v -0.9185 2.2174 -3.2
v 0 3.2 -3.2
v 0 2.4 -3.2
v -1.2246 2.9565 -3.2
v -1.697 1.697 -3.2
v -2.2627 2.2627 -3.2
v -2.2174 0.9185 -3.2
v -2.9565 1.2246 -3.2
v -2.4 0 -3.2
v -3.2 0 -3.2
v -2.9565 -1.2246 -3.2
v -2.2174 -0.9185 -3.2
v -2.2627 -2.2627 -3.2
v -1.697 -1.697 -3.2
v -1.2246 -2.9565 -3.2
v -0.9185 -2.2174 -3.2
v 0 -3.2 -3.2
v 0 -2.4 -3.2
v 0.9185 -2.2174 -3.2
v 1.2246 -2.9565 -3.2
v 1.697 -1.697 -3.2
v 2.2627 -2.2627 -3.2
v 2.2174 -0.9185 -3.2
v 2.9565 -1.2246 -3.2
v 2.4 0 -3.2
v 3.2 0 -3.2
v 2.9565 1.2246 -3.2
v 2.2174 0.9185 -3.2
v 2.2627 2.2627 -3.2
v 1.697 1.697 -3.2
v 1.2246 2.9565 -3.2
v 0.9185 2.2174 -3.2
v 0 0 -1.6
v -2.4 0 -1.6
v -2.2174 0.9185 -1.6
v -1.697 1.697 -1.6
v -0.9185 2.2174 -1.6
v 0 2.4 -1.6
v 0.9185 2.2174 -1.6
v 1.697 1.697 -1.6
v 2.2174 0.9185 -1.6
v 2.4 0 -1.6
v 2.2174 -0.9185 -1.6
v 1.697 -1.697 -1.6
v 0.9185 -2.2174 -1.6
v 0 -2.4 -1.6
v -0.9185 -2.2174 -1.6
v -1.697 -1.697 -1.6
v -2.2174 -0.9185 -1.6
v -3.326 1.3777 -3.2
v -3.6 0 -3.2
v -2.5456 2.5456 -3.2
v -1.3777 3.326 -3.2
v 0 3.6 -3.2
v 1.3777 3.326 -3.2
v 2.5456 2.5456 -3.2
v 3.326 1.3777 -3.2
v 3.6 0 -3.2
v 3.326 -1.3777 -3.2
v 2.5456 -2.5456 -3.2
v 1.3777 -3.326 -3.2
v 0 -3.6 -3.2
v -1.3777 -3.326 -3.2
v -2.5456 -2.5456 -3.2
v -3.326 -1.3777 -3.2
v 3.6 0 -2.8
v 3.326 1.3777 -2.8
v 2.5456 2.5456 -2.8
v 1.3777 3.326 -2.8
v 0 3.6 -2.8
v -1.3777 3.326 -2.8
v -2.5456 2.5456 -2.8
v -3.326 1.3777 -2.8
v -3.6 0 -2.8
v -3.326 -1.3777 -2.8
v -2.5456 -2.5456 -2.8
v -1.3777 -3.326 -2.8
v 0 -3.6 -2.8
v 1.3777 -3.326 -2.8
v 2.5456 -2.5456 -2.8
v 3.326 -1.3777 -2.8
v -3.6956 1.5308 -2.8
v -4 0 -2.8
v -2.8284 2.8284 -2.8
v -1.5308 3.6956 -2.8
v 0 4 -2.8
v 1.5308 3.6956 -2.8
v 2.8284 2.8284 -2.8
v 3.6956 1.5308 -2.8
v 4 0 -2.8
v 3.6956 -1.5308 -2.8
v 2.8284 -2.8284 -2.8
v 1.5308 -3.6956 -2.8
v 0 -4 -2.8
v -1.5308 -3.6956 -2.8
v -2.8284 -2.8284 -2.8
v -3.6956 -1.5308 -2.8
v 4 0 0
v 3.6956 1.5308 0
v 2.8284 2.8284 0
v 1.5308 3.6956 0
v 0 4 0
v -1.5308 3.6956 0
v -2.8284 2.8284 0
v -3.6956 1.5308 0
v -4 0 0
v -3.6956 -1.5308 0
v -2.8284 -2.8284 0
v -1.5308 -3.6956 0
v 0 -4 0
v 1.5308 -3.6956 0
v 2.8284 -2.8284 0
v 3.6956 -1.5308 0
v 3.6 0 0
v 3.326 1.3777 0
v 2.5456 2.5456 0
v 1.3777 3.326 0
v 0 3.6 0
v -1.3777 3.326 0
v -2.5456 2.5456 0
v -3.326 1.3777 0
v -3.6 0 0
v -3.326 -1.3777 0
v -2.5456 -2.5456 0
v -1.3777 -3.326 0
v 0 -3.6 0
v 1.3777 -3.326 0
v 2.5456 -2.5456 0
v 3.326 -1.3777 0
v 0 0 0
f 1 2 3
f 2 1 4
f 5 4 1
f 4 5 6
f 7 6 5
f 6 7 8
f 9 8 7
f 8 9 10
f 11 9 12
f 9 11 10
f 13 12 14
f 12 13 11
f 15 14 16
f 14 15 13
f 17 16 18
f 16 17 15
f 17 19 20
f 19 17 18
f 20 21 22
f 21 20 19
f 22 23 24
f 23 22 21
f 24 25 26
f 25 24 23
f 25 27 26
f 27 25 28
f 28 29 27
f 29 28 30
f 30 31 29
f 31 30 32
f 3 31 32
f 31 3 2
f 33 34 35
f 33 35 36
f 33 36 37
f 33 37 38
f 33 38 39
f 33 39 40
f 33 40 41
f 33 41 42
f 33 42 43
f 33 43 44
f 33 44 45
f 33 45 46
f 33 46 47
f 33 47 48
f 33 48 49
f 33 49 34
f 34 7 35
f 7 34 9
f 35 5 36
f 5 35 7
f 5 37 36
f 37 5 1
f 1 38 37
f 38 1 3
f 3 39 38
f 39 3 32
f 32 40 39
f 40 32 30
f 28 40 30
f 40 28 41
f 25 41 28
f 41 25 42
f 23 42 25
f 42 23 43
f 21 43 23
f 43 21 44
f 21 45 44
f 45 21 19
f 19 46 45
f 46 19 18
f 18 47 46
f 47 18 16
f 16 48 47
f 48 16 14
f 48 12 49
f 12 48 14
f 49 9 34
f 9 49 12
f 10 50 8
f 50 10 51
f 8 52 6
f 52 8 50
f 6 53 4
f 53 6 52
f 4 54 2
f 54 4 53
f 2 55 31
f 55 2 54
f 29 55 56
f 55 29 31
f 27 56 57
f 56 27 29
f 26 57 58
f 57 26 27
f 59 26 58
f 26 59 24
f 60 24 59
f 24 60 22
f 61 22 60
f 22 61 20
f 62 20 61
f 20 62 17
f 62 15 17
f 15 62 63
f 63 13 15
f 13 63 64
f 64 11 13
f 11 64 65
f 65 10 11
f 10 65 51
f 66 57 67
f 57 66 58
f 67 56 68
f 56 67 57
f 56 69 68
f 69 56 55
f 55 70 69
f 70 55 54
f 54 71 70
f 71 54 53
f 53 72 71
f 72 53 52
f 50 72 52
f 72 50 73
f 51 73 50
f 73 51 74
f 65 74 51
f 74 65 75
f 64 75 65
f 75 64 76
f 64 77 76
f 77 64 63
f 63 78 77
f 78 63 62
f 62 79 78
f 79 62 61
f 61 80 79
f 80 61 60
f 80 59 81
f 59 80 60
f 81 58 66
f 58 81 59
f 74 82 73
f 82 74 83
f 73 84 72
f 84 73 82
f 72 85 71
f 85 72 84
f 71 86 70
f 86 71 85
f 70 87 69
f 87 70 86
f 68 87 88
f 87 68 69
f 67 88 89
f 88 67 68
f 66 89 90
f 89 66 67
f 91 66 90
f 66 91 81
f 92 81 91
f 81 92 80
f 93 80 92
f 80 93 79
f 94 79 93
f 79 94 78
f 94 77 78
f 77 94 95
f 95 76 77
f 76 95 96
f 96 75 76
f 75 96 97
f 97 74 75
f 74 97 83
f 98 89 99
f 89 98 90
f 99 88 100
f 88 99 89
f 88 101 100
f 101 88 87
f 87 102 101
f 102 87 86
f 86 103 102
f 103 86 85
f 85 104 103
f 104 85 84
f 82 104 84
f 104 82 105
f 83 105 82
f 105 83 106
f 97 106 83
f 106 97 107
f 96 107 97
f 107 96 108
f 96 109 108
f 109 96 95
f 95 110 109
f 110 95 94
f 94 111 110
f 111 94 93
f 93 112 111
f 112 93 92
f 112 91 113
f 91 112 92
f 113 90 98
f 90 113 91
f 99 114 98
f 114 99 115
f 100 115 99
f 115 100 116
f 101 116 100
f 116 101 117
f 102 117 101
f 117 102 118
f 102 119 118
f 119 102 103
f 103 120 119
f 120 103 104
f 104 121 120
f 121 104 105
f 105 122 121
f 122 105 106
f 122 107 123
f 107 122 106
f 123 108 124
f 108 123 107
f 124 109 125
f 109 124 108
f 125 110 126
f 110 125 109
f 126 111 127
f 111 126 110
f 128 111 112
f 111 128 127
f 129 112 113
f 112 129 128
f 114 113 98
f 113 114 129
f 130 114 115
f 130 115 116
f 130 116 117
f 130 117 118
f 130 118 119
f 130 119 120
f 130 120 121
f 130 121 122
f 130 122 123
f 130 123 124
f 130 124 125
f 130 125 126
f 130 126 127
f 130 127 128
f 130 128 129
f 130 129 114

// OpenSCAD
// file: ../p/4-4ring3.scad
use <../lib.scad>
function ldraw_lib__4_4ring3() = [
// 0 Ring  3 x 1.0
// 0 Name: 4-4ring3.dat
// 0 Author: James Jessiman
// 0 !LDRAW_ORG Primitive UPDATE 2009-01
// 0 !LICENSE Licensed under CC BY 4.0 : see CAreadme.txt
// 
// 0 BFC CERTIFY CCW
  [0,"BFC","CERTIFY"],
  [0,"BFC","CCW"],
// 
// 0 !HISTORY 1998-12-15 [PTadmin] Official Update 1998-10
// 0 !HISTORY 2002-04-05 [hafhead] Added BFC statement
// 0 !HISTORY 2002-04-25 [PTadmin] Official Update 2002-02
// 0 !HISTORY 2007-06-24 [PTadmin] Header formatted for Contributor Agreement
// 0 !HISTORY 2008-07-01 [PTadmin] Official Update 2008-01
// 0 !HISTORY 2008-08-26 [cwdee] Switch polygon winding and rename
// 0 !HISTORY 2009-05-02 [PTadmin] Official Update 2009-01
// 
// 
// 4 16 -1.5308 0 3.6956 -1.1481 0 2.7717 0 0 3 0 0 4
  [4,16,-1.5308,0,3.6956,-1.1481,0,2.7717,0,0,3,0,0,4],
// 4 16 -2.8284 0 2.8284 -2.1213 0 2.1213 -1.1481 0 2.7717 -1.5308 0 3.6956
  [4,16,-2.8284,0,2.8284,-2.1213,0,2.1213,-1.1481,0,2.7717,-1.5308,0,3.6956],
// 4 16 -3.6956 0 1.5308 -2.7717 0 1.1481 -2.1213 0 2.1213 -2.8284 0 2.8284
  [4,16,-3.6956,0,1.5308,-2.7717,0,1.1481,-2.1213,0,2.1213,-2.8284,0,2.8284],
// 4 16 -4 0 0 -3 0 0 -2.7717 0 1.1481 -3.6956 0 1.5308
  [4,16,-4,0,0,-3,0,0,-2.7717,0,1.1481,-3.6956,0,1.5308],
// 4 16 -3.6956 0 -1.5308 -2.7717 0 -1.1481 -3 0 0 -4 0 0
  [4,16,-3.6956,0,-1.5308,-2.7717,0,-1.1481,-3,0,0,-4,0,0],
// 4 16 -2.8284 0 -2.8284 -2.1213 0 -2.1213 -2.7717 0 -1.1481 -3.6956 0 -1.5308
  [4,16,-2.8284,0,-2.8284,-2.1213,0,-2.1213,-2.7717,0,-1.1481,-3.6956,0,-1.5308],
// 4 16 -1.5308 0 -3.6956 -1.1481 0 -2.7717 -2.1213 0 -2.1213 -2.8284 0 -2.8284
  [4,16,-1.5308,0,-3.6956,-1.1481,0,-2.7717,-2.1213,0,-2.1213,-2.8284,0,-2.8284],
// 4 16 0 0 -4 0 0 -3 -1.1481 0 -2.7717 -1.5308 0 -3.6956
  [4,16,0,0,-4,0,0,-3,-1.1481,0,-2.7717,-1.5308,0,-3.6956],
// 4 16 1.5308 0 -3.6956 1.1481 0 -2.7717 0 0 -3 0 0 -4
  [4,16,1.5308,0,-3.6956,1.1481,0,-2.7717,0,0,-3,0,0,-4],
// 4 16 2.8284 0 -2.8284 2.1213 0 -2.1213 1.1481 0 -2.7717 1.5308 0 -3.6956
  [4,16,2.8284,0,-2.8284,2.1213,0,-2.1213,1.1481,0,-2.7717,1.5308,0,-3.6956],
// 4 16 3.6956 0 -1.5308 2.7717 0 -1.1481 2.1213 0 -2.1213 2.8284 0 -2.8284
  [4,16,3.6956,0,-1.5308,2.7717,0,-1.1481,2.1213,0,-2.1213,2.8284,0,-2.8284],
// 4 16 4 0 0 3 0 0 2.7717 0 -1.1481 3.6956 0 -1.5308
  [4,16,4,0,0,3,0,0,2.7717,0,-1.1481,3.6956,0,-1.5308],
// 4 16 3.6956 0 1.5308 2.7717 0 1.1481 3 0 0 4 0 0
  [4,16,3.6956,0,1.5308,2.7717,0,1.1481,3,0,0,4,0,0],
// 4 16 2.8284 0 2.8284 2.1213 0 2.1213 2.7717 0 1.1481 3.6956 0 1.5308
  [4,16,2.8284,0,2.8284,2.1213,0,2.1213,2.7717,0,1.1481,3.6956,0,1.5308],
// 4 16 1.5308 0 3.6956 1.1481 0 2.7717 2.1213 0 2.1213 2.8284 0 2.8284
  [4,16,1.5308,0,3.6956,1.1481,0,2.7717,2.1213,0,2.1213,2.8284,0,2.8284],
// 4 16 0 0 4 0 0 3 1.1481 0 2.7717 1.5308 0 3.6956
  [4,16,0,0,4,0,0,3,1.1481,0,2.7717,1.5308,0,3.6956],
// 0
];
module ldraw_lib__4_4ring3(step=0, col=false, unit=2/5, alt=false, line=0.2, solid=!$preview)
    makepoly(ldraw_lib__4_4ring3(), step=step, col=col, unit=unit, alt=alt, line=line, solid=solid);
ldraw_lib__4_4ring3(line=0.2);
// file: ../p/4-4cylc.scad
use <../lib.scad>
use <4-4cyli.scad>
use <4-4disc.scad>
use <4-4edge.scad>
function ldraw_lib__4_4cylc() = [
// 0 Cylinder Closed 1.0
// 0 Name: 4-4cylc.dat
// 0 Author: Alex Taylor [anathema]
// 0 !LDRAW_ORG Primitive UPDATE 2009-02
// 0 !LICENSE Licensed under CC BY 4.0 : see CAreadme.txt
// 
// 0 BFC CERTIFY CCW
  [0,"BFC","CERTIFY"],
  [0,"BFC","CCW"],
// 
// 0 !HISTORY 2008-12-29 [cwdee] Removed one disc
// 0 !HISTORY 2009-09-03 [PTadmin] Official Update 2009-02
// 
// 
// 1 16 0 0 0 1 0 0 0 1 0 0 0 1 4-4edge.dat
  [1,16,0,0,0,1,0,0,0,1,0,0,0,1, ldraw_lib__4_4edge()],
// 1 16 0 1 0 1 0 0 0 1 0 0 0 1 4-4edge.dat
  [1,16,0,1,0,1,0,0,0,1,0,0,0,1, ldraw_lib__4_4edge()],
// 1 16 0 0 0 1 0 0 0 1 0 0 0 1 4-4disc.dat
  [1,16,0,0,0,1,0,0,0,1,0,0,0,1, ldraw_lib__4_4disc()],
// 1 16 0 0 0 1 0 0 0 1 0 0 0 1 4-4cyli.dat
  [1,16,0,0,0,1,0,0,0,1,0,0,0,1, ldraw_lib__4_4cyli()],
// 0
];
module ldraw_lib__4_4cylc(step=0, col=false, unit=2/5, alt=false, line=0.2, solid=!$preview)
    makepoly(ldraw_lib__4_4cylc(), step=step, col=col, unit=unit, alt=alt, line=line, solid=solid);
ldraw_lib__4_4cylc(line=0.2);
// file: ../p/4-4edge.scad
use <../lib.scad>
function ldraw_lib__4_4edge() = [
// 0 Circle 1.0
// 0 Name: 4-4edge.dat
// 0 Author: James Jessiman
// 0 !LDRAW_ORG Primitive UPDATE 2017-01
// 0 !LICENSE Licensed under CC BY 4.0 : see CAreadme.txt
// 
// 0 BFC CERTIFY CCW
  [0,"BFC","CERTIFY"],
  [0,"BFC","CCW"],
// 
// 0 !HISTORY 1998-12-15 [PTadmin] Official Update 1998-10
// 0 !HISTORY 2005-12-28 [PTadmin] Official Update 2005-01
// 0 !HISTORY 2007-06-24 [PTadmin] Header formatted for Contributor Agreement
// 0 !HISTORY 2008-07-01 [PTadmin] Official Update 2008-01
// 0 !HISTORY 2017-01-15 [Steffen] BFCed
// 0 !HISTORY 2017-12-30 [PTadmin] Official Update 2017-01
// 
// 
// 2 24 1 0 0 0.9239 0 0.3827
  [2,24,1,0,0,0.9239,0,0.3827],
// 2 24 0.9239 0 0.3827 0.7071 0 0.7071
  [2,24,0.9239,0,0.3827,0.7071,0,0.7071],
// 2 24 0.7071 0 0.7071 0.3827 0 0.9239
  [2,24,0.7071,0,0.7071,0.3827,0,0.9239],
// 2 24 0.3827 0 0.9239 0 0 1
  [2,24,0.3827,0,0.9239,0,0,1],
// 2 24 0 0 1 -0.3827 0 0.9239
  [2,24,0,0,1,-0.3827,0,0.9239],
// 2 24 -0.3827 0 0.9239 -0.7071 0 0.7071
  [2,24,-0.3827,0,0.9239,-0.7071,0,0.7071],
// 2 24 -0.7071 0 0.7071 -0.9239 0 0.3827
  [2,24,-0.7071,0,0.7071,-0.9239,0,0.3827],
// 2 24 -0.9239 0 0.3827 -1 0 -0
  [2,24,-0.9239,0,0.3827,-1,0,-0],
// 2 24 -1 0 -0 -0.9239 0 -0.3827
  [2,24,-1,0,-0,-0.9239,0,-0.3827],
// 2 24 -0.9239 0 -0.3827 -0.7071 0 -0.7071
  [2,24,-0.9239,0,-0.3827,-0.7071,0,-0.7071],
// 2 24 -0.7071 0 -0.7071 -0.3827 0 -0.9239
  [2,24,-0.7071,0,-0.7071,-0.3827,0,-0.9239],
// 2 24 -0.3827 0 -0.9239 0 0 -1
  [2,24,-0.3827,0,-0.9239,0,0,-1],
// 2 24 0 0 -1 0.3827 0 -0.9239
  [2,24,0,0,-1,0.3827,0,-0.9239],
// 2 24 0.3827 0 -0.9239 0.7071 0 -0.7071
  [2,24,0.3827,0,-0.9239,0.7071,0,-0.7071],
// 2 24 0.7071 0 -0.7071 0.9239 0 -0.3827
  [2,24,0.7071,0,-0.7071,0.9239,0,-0.3827],
// 2 24 0.9239 0 -0.3827 1 0 0
  [2,24,0.9239,0,-0.3827,1,0,0],
];
module ldraw_lib__4_4edge(step=0, col=false, unit=2/5, alt=false, line=0.2, solid=!$preview)
    makepoly(ldraw_lib__4_4edge(), step=step, col=col, unit=unit, alt=alt, line=line, solid=solid);
ldraw_lib__4_4edge(line=0.2);
// file: ../p/4-4cyli.scad
use <../lib.scad>
function ldraw_lib__4_4cyli() = [
// 0 Cylinder 1.0
// 0 Name: 4-4cyli.dat
// 0 Author: James Jessiman
// 0 !LDRAW_ORG Primitive UPDATE 2005-01
// 0 !LICENSE Licensed under CC BY 4.0 : see CAreadme.txt
// 
// 0 BFC CERTIFY CCW
  [0,"BFC","CERTIFY"],
  [0,"BFC","CCW"],
// 
// 0 !HISTORY 1998-12-15 [PTadmin] Official Update 1998-10
// 0 !HISTORY 2002-03-23 [sbliss] Added BFC statement; merged headers from files in distributions LDraw 0.27 and Complete.
// 0 !HISTORY 2002-04-25 [PTadmin] Official Update 2002-02
// 0 !HISTORY 2004-12-14 [guyvivan] BFC CCW
// 0 !HISTORY 2005-12-28 [PTadmin] Official Update 2005-01
// 0 !HISTORY 2007-06-24 [PTadmin] Header formatted for Contributor Agreement
// 0 !HISTORY 2008-07-01 [PTadmin] Official Update 2008-01
// 
// 
// 4 16 1 1 0 0.9239 1 0.3827 0.9239 0 0.3827 1 0 0
  [4,16,1,1,0,0.9239,1,0.3827,0.9239,0,0.3827,1,0,0],
// 5 24 1 0 0 1 1 0 0.9239 0 0.3827 0.9239 0 -0.3827
  [5,24,1,0,0,1,1,0,0.9239,0,0.3827,0.9239,0,-0.3827],
// 4 16 0.9239 1 0.3827 0.7071 1 0.7071 0.7071 0 0.7071 0.9239 0 0.3827
  [4,16,0.9239,1,0.3827,0.7071,1,0.7071,0.7071,0,0.7071,0.9239,0,0.3827],
// 5 24 0.9239 0 0.3827 0.9239 1 0.3827 0.7071 0 0.7071 1 0 0
  [5,24,0.9239,0,0.3827,0.9239,1,0.3827,0.7071,0,0.7071,1,0,0],
// 4 16 0.7071 1 0.7071 0.3827 1 0.9239 0.3827 0 0.9239 0.7071 0 0.7071
  [4,16,0.7071,1,0.7071,0.3827,1,0.9239,0.3827,0,0.9239,0.7071,0,0.7071],
// 5 24 0.7071 0 0.7071 0.7071 1 0.7071 0.3827 0 0.9239 0.9239 0 0.3827
  [5,24,0.7071,0,0.7071,0.7071,1,0.7071,0.3827,0,0.9239,0.9239,0,0.3827],
// 4 16 0.3827 1 0.9239 0 1 1 0 0 1 0.3827 0 0.9239
  [4,16,0.3827,1,0.9239,0,1,1,0,0,1,0.3827,0,0.9239],
// 5 24 0.3827 0 0.9239 0.3827 1 0.9239 0 0 1 0.7071 0 0.7071
  [5,24,0.3827,0,0.9239,0.3827,1,0.9239,0,0,1,0.7071,0,0.7071],
// 4 16 0 1 1 -0.3827 1 0.9239 -0.3827 0 0.9239 0 0 1
  [4,16,0,1,1,-0.3827,1,0.9239,-0.3827,0,0.9239,0,0,1],
// 5 24 0 0 1 0 1 1 -0.3827 0 0.9239 0.3827 0 0.9239
  [5,24,0,0,1,0,1,1,-0.3827,0,0.9239,0.3827,0,0.9239],
// 4 16 -0.3827 1 0.9239 -0.7071 1 0.7071 -0.7071 0 0.7071 -0.3827 0 0.9239
  [4,16,-0.3827,1,0.9239,-0.7071,1,0.7071,-0.7071,0,0.7071,-0.3827,0,0.9239],
// 5 24 -0.3827 0 0.9239 -0.3827 1 0.9239 -0.7071 0 0.7071 0 0 1
  [5,24,-0.3827,0,0.9239,-0.3827,1,0.9239,-0.7071,0,0.7071,0,0,1],
// 4 16 -0.7071 1 0.7071 -0.9239 1 0.3827 -0.9239 0 0.3827 -0.7071 0 0.7071
  [4,16,-0.7071,1,0.7071,-0.9239,1,0.3827,-0.9239,0,0.3827,-0.7071,0,0.7071],
// 5 24 -0.7071 0 0.7071 -0.7071 1 0.7071 -0.9239 0 0.3827 -0.3827 0 0.9239
  [5,24,-0.7071,0,0.7071,-0.7071,1,0.7071,-0.9239,0,0.3827,-0.3827,0,0.9239],
// 4 16 -0.9239 1 0.3827 -1 1 0 -1 0 0 -0.9239 0 0.3827
  [4,16,-0.9239,1,0.3827,-1,1,0,-1,0,0,-0.9239,0,0.3827],
// 5 24 -0.9239 0 0.3827 -0.9239 1 0.3827 -1 0 0 -0.7071 0 0.7071
  [5,24,-0.9239,0,0.3827,-0.9239,1,0.3827,-1,0,0,-0.7071,0,0.7071],
// 4 16 -1 1 0 -0.9239 1 -0.3827 -0.9239 0 -0.3827 -1 0 0
  [4,16,-1,1,0,-0.9239,1,-0.3827,-0.9239,0,-0.3827,-1,0,0],
// 5 24 -1 0 0 -1 1 0 -0.9239 0 -0.3827 -0.9239 0 0.3827
  [5,24,-1,0,0,-1,1,0,-0.9239,0,-0.3827,-0.9239,0,0.3827],
// 4 16 -0.9239 1 -0.3827 -0.7071 1 -0.7071 -0.7071 0 -0.7071 -0.9239 0 -0.3827
  [4,16,-0.9239,1,-0.3827,-0.7071,1,-0.7071,-0.7071,0,-0.7071,-0.9239,0,-0.3827],
// 5 24 -0.9239 0 -0.3827 -0.9239 1 -0.3827 -0.7071 0 -0.7071 -1 0 0
  [5,24,-0.9239,0,-0.3827,-0.9239,1,-0.3827,-0.7071,0,-0.7071,-1,0,0],
// 4 16 -0.7071 1 -0.7071 -0.3827 1 -0.9239 -0.3827 0 -0.9239 -0.7071 0 -0.7071
  [4,16,-0.7071,1,-0.7071,-0.3827,1,-0.9239,-0.3827,0,-0.9239,-0.7071,0,-0.7071],
// 5 24 -0.7071 0 -0.7071 -0.7071 1 -0.7071 -0.3827 0 -0.9239 -0.9239 0 -0.3827
  [5,24,-0.7071,0,-0.7071,-0.7071,1,-0.7071,-0.3827,0,-0.9239,-0.9239,0,-0.3827],
// 4 16 -0.3827 1 -0.9239 0 1 -1 0 0 -1 -0.3827 0 -0.9239
  [4,16,-0.3827,1,-0.9239,0,1,-1,0,0,-1,-0.3827,0,-0.9239],
// 5 24 -0.3827 0 -0.9239 -0.3827 1 -0.9239 0 0 -1 -0.7071 0 -0.7071
  [5,24,-0.3827,0,-0.9239,-0.3827,1,-0.9239,0,0,-1,-0.7071,0,-0.7071],
// 4 16 0 1 -1 0.3827 1 -0.9239 0.3827 0 -0.9239 0 0 -1
  [4,16,0,1,-1,0.3827,1,-0.9239,0.3827,0,-0.9239,0,0,-1],
// 5 24 0 0 -1 0 1 -1 0.3827 0 -0.9239 -0.3827 0 -0.9239
  [5,24,0,0,-1,0,1,-1,0.3827,0,-0.9239,-0.3827,0,-0.9239],
// 4 16 0.3827 1 -0.9239 0.7071 1 -0.7071 0.7071 0 -0.7071 0.3827 0 -0.9239
  [4,16,0.3827,1,-0.9239,0.7071,1,-0.7071,0.7071,0,-0.7071,0.3827,0,-0.9239],
// 5 24 0.3827 0 -0.9239 0.3827 1 -0.9239 0.7071 0 -0.7071 0 0 -1
  [5,24,0.3827,0,-0.9239,0.3827,1,-0.9239,0.7071,0,-0.7071,0,0,-1],
// 4 16 0.7071 1 -0.7071 0.9239 1 -0.3827 0.9239 0 -0.3827 0.7071 0 -0.7071
  [4,16,0.7071,1,-0.7071,0.9239,1,-0.3827,0.9239,0,-0.3827,0.7071,0,-0.7071],
// 5 24 0.7071 0 -0.7071 0.7071 1 -0.7071 0.9239 0 -0.3827 0.3827 0 -0.9239
  [5,24,0.7071,0,-0.7071,0.7071,1,-0.7071,0.9239,0,-0.3827,0.3827,0,-0.9239],
// 4 16 0.9239 1 -0.3827 1 1 0 1 0 0 0.9239 0 -0.3827
  [4,16,0.9239,1,-0.3827,1,1,0,1,0,0,0.9239,0,-0.3827],
// 5 24 0.9239 0 -0.3827 0.9239 1 -0.3827 1 0 0 0.7071 0 -0.7071
  [5,24,0.9239,0,-0.3827,0.9239,1,-0.3827,1,0,0,0.7071,0,-0.7071],
// 0
];
module ldraw_lib__4_4cyli(step=0, col=false, unit=2/5, alt=false, line=0.2, solid=!$preview)
    makepoly(ldraw_lib__4_4cyli(), step=step, col=col, unit=unit, alt=alt, line=line, solid=solid);
ldraw_lib__4_4cyli(line=0.2);
// file: ../p/stud4o.scad
use <../lib.scad>
use <4-4cylc.scad>
use <4-4ring3.scad>
function ldraw_lib__stud4o() = [
// 0 Stud Tube Open without Outer Cylinder
// 0 Name: stud4o.dat
// 0 Author: Magnus Forsberg [MagFors]
// 0 !LDRAW_ORG Primitive UPDATE 2011-02
// 0 !LICENSE Licensed under CC BY 4.0 : see CAreadme.txt
// 
// 0 !HELP This stud is a "antistud" to be used like a underside stud,
// 0 !HELP but without the outer cylinder.
// 0 !HELP 1 47 0 0 0 1 0 0 0 1 0 0 0 1 stud4.dat
// 
// 0 BFC CERTIFY CCW
  [0,"BFC","CERTIFY"],
  [0,"BFC","CCW"],
// 
// 0 !HISTORY 2011-12-29 [PTadmin] Official Update 2011-02
// 
// 
// 1 16 0 -4 0 2 0 0 0 1 0 0 0 2 4-4ring3.dat
  [1,16,0,-4,0,2,0,0,0,1,0,0,0,2, ldraw_lib__4_4ring3()],
// 0 BFC INVERTNEXT
  [0,"BFC","INVERTNEXT"],
// 1 16 0 0 0 -6 0 0 0 -4 0 0 0 6 4-4cylc.dat
  [1,16,0,0,0,-6,0,0,0,-4,0,0,0,6, ldraw_lib__4_4cylc()],
];
module ldraw_lib__stud4o(step=0, col=false, unit=2/5, alt=false, line=0.2, solid=!$preview)
    makepoly(ldraw_lib__stud4o(), step=step, col=col, unit=unit, alt=alt, line=line, solid=solid);
ldraw_lib__stud4o(line=0.2);
// file: ../p/4-4ring8.scad
use <../lib.scad>
function ldraw_lib__4_4ring8() = [
// 0 Ring  8 x 1.0
// 0 Name: 4-4ring8.dat
// 0 Author: Steffen [Steffen]
// 0 !LDRAW_ORG Primitive UPDATE 2012-01
// 0 !LICENSE Licensed under CC BY 4.0 : see CAreadme.txt
// 
// 0 BFC CERTIFY CCW
  [0,"BFC","CERTIFY"],
  [0,"BFC","CCW"],
// 
// 0 !HISTORY 2003-12-19 [PTadmin] Official Update 2003-03
// 0 !HISTORY 2007-06-24 [PTadmin] Header formatted for Contributor Agreement
// 0 !HISTORY 2008-07-01 [PTadmin] Official Update 2008-01
// 0 !HISTORY 2012-02-16 [Philo] Changed to CCW
// 0 !HISTORY 2012-03-30 [PTadmin] Official Update 2012-01
// 
// 
// 4 16 9 0 0 8.3151 0 3.4443 7.3912 0 3.0616 8 0 0
  [4,16,9,0,0,8.3151,0,3.4443,7.3912,0,3.0616,8,0,0],
// 4 16 8.3151 0 3.4443 6.3639 0 6.3639 5.6568 0 5.6568 7.3912 0 3.0616
  [4,16,8.3151,0,3.4443,6.3639,0,6.3639,5.6568,0,5.6568,7.3912,0,3.0616],
// 4 16 6.3639 0 6.3639 3.4443 0 8.3151 3.0616 0 7.3912 5.6568 0 5.6568
  [4,16,6.3639,0,6.3639,3.4443,0,8.3151,3.0616,0,7.3912,5.6568,0,5.6568],
// 4 16 3.4443 0 8.3151 0 0 9 0 0 8 3.0616 0 7.3912
  [4,16,3.4443,0,8.3151,0,0,9,0,0,8,3.0616,0,7.3912],
// 4 16 0 0 9 -3.4443 0 8.3151 -3.0616 0 7.3912 0 0 8
  [4,16,0,0,9,-3.4443,0,8.3151,-3.0616,0,7.3912,0,0,8],
// 4 16 -3.4443 0 8.3151 -6.3639 0 6.3639 -5.6568 0 5.6568 -3.0616 0 7.3912
  [4,16,-3.4443,0,8.3151,-6.3639,0,6.3639,-5.6568,0,5.6568,-3.0616,0,7.3912],
// 4 16 -6.3639 0 6.3639 -8.3151 0 3.4443 -7.3912 0 3.0616 -5.6568 0 5.6568
  [4,16,-6.3639,0,6.3639,-8.3151,0,3.4443,-7.3912,0,3.0616,-5.6568,0,5.6568],
// 4 16 -8.3151 0 3.4443 -9 0 0 -8 0 0 -7.3912 0 3.0616
  [4,16,-8.3151,0,3.4443,-9,0,0,-8,0,0,-7.3912,0,3.0616],
// 4 16 -9 0 0 -8.3151 0 -3.4443 -7.3912 0 -3.0616 -8 0 0
  [4,16,-9,0,0,-8.3151,0,-3.4443,-7.3912,0,-3.0616,-8,0,0],
// 4 16 -8.3151 0 -3.4443 -6.3639 0 -6.3639 -5.6568 0 -5.6568 -7.3912 0 -3.0616
  [4,16,-8.3151,0,-3.4443,-6.3639,0,-6.3639,-5.6568,0,-5.6568,-7.3912,0,-3.0616],
// 4 16 -6.3639 0 -6.3639 -3.4443 0 -8.3151 -3.0616 0 -7.3912 -5.6568 0 -5.6568
  [4,16,-6.3639,0,-6.3639,-3.4443,0,-8.3151,-3.0616,0,-7.3912,-5.6568,0,-5.6568],
// 4 16 -3.4443 0 -8.3151 0 0 -9 0 0 -8 -3.0616 0 -7.3912
  [4,16,-3.4443,0,-8.3151,0,0,-9,0,0,-8,-3.0616,0,-7.3912],
// 4 16 0 0 -9 3.4443 0 -8.3151 3.0616 0 -7.3912 0 0 -8
  [4,16,0,0,-9,3.4443,0,-8.3151,3.0616,0,-7.3912,0,0,-8],
// 4 16 3.4443 0 -8.3151 6.3639 0 -6.3639 5.6568 0 -5.6568 3.0616 0 -7.3912
  [4,16,3.4443,0,-8.3151,6.3639,0,-6.3639,5.6568,0,-5.6568,3.0616,0,-7.3912],
// 4 16 6.3639 0 -6.3639 8.3151 0 -3.4443 7.3912 0 -3.0616 5.6568 0 -5.6568
  [4,16,6.3639,0,-6.3639,8.3151,0,-3.4443,7.3912,0,-3.0616,5.6568,0,-5.6568],
// 4 16 8.3151 0 -3.4443 9 0 0 8 0 0 7.3912 0 -3.0616
  [4,16,8.3151,0,-3.4443,9,0,0,8,0,0,7.3912,0,-3.0616],
];
module ldraw_lib__4_4ring8(step=0, col=false, unit=2/5, alt=false, line=0.2, solid=!$preview)
    makepoly(ldraw_lib__4_4ring8(), step=step, col=col, unit=unit, alt=alt, line=line, solid=solid);
ldraw_lib__4_4ring8(line=0.2);
// file: ../p/4-4cylo.scad
use <../lib.scad>
use <4-4cyli.scad>
use <4-4edge.scad>
function ldraw_lib__4_4cylo() = [
// 0 Cylinder Open 1.0
// 0 Name: 4-4cylo.dat
// 0 Author: Mark Kennedy [mkennedy]
// 0 !LDRAW_ORG Primitive UPDATE 2010-01
// 0 !LICENSE Licensed under CC BY 4.0 : see CAreadme.txt
// 
// 0 BFC CERTIFY CCW
  [0,"BFC","CERTIFY"],
  [0,"BFC","CCW"],
// 
// 0 !HISTORY 2010-04-05 [PTadmin] Official Update 2010-01
// 
// 
// 1 16 0 0 0 1 0 0 0 1 0 0 0 1 4-4edge.dat
  [1,16,0,0,0,1,0,0,0,1,0,0,0,1, ldraw_lib__4_4edge()],
// 1 16 0 1 0 1 0 0 0 1 0 0 0 1 4-4edge.dat
  [1,16,0,1,0,1,0,0,0,1,0,0,0,1, ldraw_lib__4_4edge()],
// 1 16 0 0 0 1 0 0 0 1 0 0 0 1 4-4cyli.dat
  [1,16,0,0,0,1,0,0,0,1,0,0,0,1, ldraw_lib__4_4cyli()],
// 0
];
module ldraw_lib__4_4cylo(step=0, col=false, unit=2/5, alt=false, line=0.2, solid=!$preview)
    makepoly(ldraw_lib__4_4cylo(), step=step, col=col, unit=unit, alt=alt, line=line, solid=solid);
ldraw_lib__4_4cylo(line=0.2);
// file: s/98138s02.scad
use <../../lib.scad>
use <../../p/4-4cylo.scad>
use <../../p/4-4ring8.scad>
use <../../p/4-4ring9.scad>
use <../../p/stud4o.scad>
function ldraw_lib__s__98138s02() = [
// 0 ~Tile  1 x  1 Round with Groove without Complete Top Face
// 0 Name: s\98138s02.dat
// 0 Author: Magnus Forsberg [MagFors]
// 0 !LDRAW_ORG Subpart UPDATE 2020-01
// 0 !LICENSE Licensed under CC BY 4.0 : see CAreadme.txt
// 
// 0 BFC CERTIFY CCW
  [0,"BFC","CERTIFY"],
  [0,"BFC","CCW"],
// 
// 0 !HISTORY 2020-06-28 [PTadmin] Official Update 2020-01
// 
// 
// 1 16 0 4 0 1 0 0 0 -1 0 0 0 1 stud4o.dat
  [1,16,0,4,0,1,0,0,0,-1,0,0,0,1, ldraw_lib__stud4o()],
// 1 16 0 8 0 -1 0 0 0 -1 0 0 0 1 4-4ring8.dat
  [1,16,0,8,0,-1,0,0,0,-1,0,0,0,1, ldraw_lib__4_4ring8()],
// 1 16 0 7 0 9 0 0 0 1 0 0 0 9 4-4cylo.dat
  [1,16,0,7,0,9,0,0,0,1,0,0,0,9, ldraw_lib__4_4cylo()],
// 1 16 0 7 0 -1 0 0 0 -1 0 0 0 1 4-4ring9.dat
  [1,16,0,7,0,-1,0,0,0,-1,0,0,0,1, ldraw_lib__4_4ring9()],
// 1 16 0 0 0 10 0 0 0 7 0 0 0 10 4-4cylo.dat
  [1,16,0,0,0,10,0,0,0,7,0,0,0,10, ldraw_lib__4_4cylo()],
];
module ldraw_lib__s__98138s02(step=0, col=false, unit=2/5, alt=false, line=0.2, solid=!$preview)
    makepoly(ldraw_lib__s__98138s02(), step=step, col=col, unit=unit, alt=alt, line=line, solid=solid);
ldraw_lib__s__98138s02(line=0.2);
// file: ../p/4-4ring9.scad
use <../lib.scad>
function ldraw_lib__4_4ring9() = [
// 0 Ring  9 x 1.0
// 0 Name: 4-4ring9.dat
// 0 Author: Magnus Forsberg [MagFors]
// 0 !LDRAW_ORG Primitive UPDATE 2024-01
// 0 !LICENSE Licensed under CC BY 4.0 : see CAreadme.txt
// 
// 0 BFC CERTIFY CCW
  [0,"BFC","CERTIFY"],
  [0,"BFC","CCW"],
// 
// 0 !HISTORY 2004-04-22 [PTadmin] Official Update 2004-02
// 0 !HISTORY 2007-06-24 [PTadmin] Header formatted for Contributor Agreement
// 0 !HISTORY 2008-07-01 [PTadmin] Official Update 2008-01
// 0 !HISTORY 2024-01-04 [MagFors] Complete regeneration, original by jriley
// 0 !HISTORY 2024-01-29 [OrionP] Official Update 2024-01
// 
// 4 16 10 0 0 9.239 0 3.827 8.3151 0 3.4443 9 0 0
  [4,16,10,0,0,9.239,0,3.827,8.3151,0,3.4443,9,0,0],
// 4 16 9.239 0 3.827 7.071 0 7.071 6.3639 0 6.3639 8.3151 0 3.4443
  [4,16,9.239,0,3.827,7.071,0,7.071,6.3639,0,6.3639,8.3151,0,3.4443],
// 4 16 7.071 0 7.071 3.827 0 9.239 3.4443 0 8.3151 6.3639 0 6.3639
  [4,16,7.071,0,7.071,3.827,0,9.239,3.4443,0,8.3151,6.3639,0,6.3639],
// 4 16 3.827 0 9.239 0 0 10 0 0 9 3.4443 0 8.3151
  [4,16,3.827,0,9.239,0,0,10,0,0,9,3.4443,0,8.3151],
// 4 16 0 0 10 -3.827 0 9.239 -3.4443 0 8.3151 0 0 9
  [4,16,0,0,10,-3.827,0,9.239,-3.4443,0,8.3151,0,0,9],
// 4 16 -3.827 0 9.239 -7.071 0 7.071 -6.3639 0 6.3639 -3.4443 0 8.3151
  [4,16,-3.827,0,9.239,-7.071,0,7.071,-6.3639,0,6.3639,-3.4443,0,8.3151],
// 4 16 -7.071 0 7.071 -9.239 0 3.827 -8.3151 0 3.4443 -6.3639 0 6.3639
  [4,16,-7.071,0,7.071,-9.239,0,3.827,-8.3151,0,3.4443,-6.3639,0,6.3639],
// 4 16 -9.239 0 3.827 -10 0 0 -9 0 0 -8.3151 0 3.4443
  [4,16,-9.239,0,3.827,-10,0,0,-9,0,0,-8.3151,0,3.4443],
// 4 16 -10 0 0 -9.239 0 -3.827 -8.3151 0 -3.4443 -9 0 0
  [4,16,-10,0,0,-9.239,0,-3.827,-8.3151,0,-3.4443,-9,0,0],
// 4 16 -9.239 0 -3.827 -7.071 0 -7.071 -6.3639 0 -6.3639 -8.3151 0 -3.4443
  [4,16,-9.239,0,-3.827,-7.071,0,-7.071,-6.3639,0,-6.3639,-8.3151,0,-3.4443],
// 4 16 -7.071 0 -7.071 -3.827 0 -9.239 -3.4443 0 -8.3151 -6.3639 0 -6.3639
  [4,16,-7.071,0,-7.071,-3.827,0,-9.239,-3.4443,0,-8.3151,-6.3639,0,-6.3639],
// 4 16 -3.827 0 -9.239 0 0 -10 0 0 -9 -3.4443 0 -8.3151
  [4,16,-3.827,0,-9.239,0,0,-10,0,0,-9,-3.4443,0,-8.3151],
// 4 16 0 0 -10 3.827 0 -9.239 3.4443 0 -8.3151 0 0 -9
  [4,16,0,0,-10,3.827,0,-9.239,3.4443,0,-8.3151,0,0,-9],
// 4 16 3.827 0 -9.239 7.071 0 -7.071 6.3639 0 -6.3639 3.4443 0 -8.3151
  [4,16,3.827,0,-9.239,7.071,0,-7.071,6.3639,0,-6.3639,3.4443,0,-8.3151],
// 4 16 7.071 0 -7.071 9.239 0 -3.827 8.3151 0 -3.4443 6.3639 0 -6.3639
  [4,16,7.071,0,-7.071,9.239,0,-3.827,8.3151,0,-3.4443,6.3639,0,-6.3639],
// 4 16 9.239 0 -3.827 10 0 0 9 0 0 8.3151 0 -3.4443
  [4,16,9.239,0,-3.827,10,0,0,9,0,0,8.3151,0,-3.4443],
// 0 // Build by LDPartEditor (PrimGen 2.X)
];
module ldraw_lib__4_4ring9(step=0, col=false, unit=2/5, alt=false, line=0.2, solid=!$preview)
    makepoly(ldraw_lib__4_4ring9(), step=step, col=col, unit=unit, alt=alt, line=line, solid=solid);
ldraw_lib__4_4ring9(line=0.2);
// file: s/98138s01.scad
use <../../lib.scad>
use <../../p/4-4ring9.scad>
use <98138s02.scad>
function ldraw_lib__s__98138s01() = [
// 0 ~Tile  1 x  1 Round with Groove with Partial Top Face
// 0 Name: s\98138s01.dat
// 0 Author: Magnus Forsberg [MagFors]
// 0 !LDRAW_ORG Subpart UPDATE 2020-01
// 0 !LICENSE Licensed under CC BY 4.0 : see CAreadme.txt
// 
// 0 BFC CERTIFY CCW
  [0,"BFC","CERTIFY"],
  [0,"BFC","CCW"],
// 
// 0 !HISTORY 2011-12-29 [PTadmin] Official Update 2011-02
// 0 !HISTORY 2016-06-17 [MagFors] Reduced the rounded edge to 0.5 ldu
// 0 !HISTORY 2016-12-31 [PTadmin] Official Update 2016-01
// 0 !HISTORY 2019-06-17 [MagFors] Removed the rounded edge
// 0 !HISTORY 2019-07-19 [MagFors] Subfiled without top surface
// 0 !HISTORY 2020-06-28 [PTadmin] Official Update 2020-01
// 
// 
// 1 16 0 0 0 1 0 0 0 1 0 0 0 1 s\98138s02.dat
  [1,16,0,0,0,1,0,0,0,1,0,0,0,1, ldraw_lib__s__98138s02()],
// 1 16 0 0 0 1 0 0 0 1 0 0 0 1 4-4ring9.dat
  [1,16,0,0,0,1,0,0,0,1,0,0,0,1, ldraw_lib__4_4ring9()],
];
module ldraw_lib__s__98138s01(step=0, col=false, unit=2/5, alt=false, line=0.2, solid=!$preview)
    makepoly(ldraw_lib__s__98138s01(), step=step, col=col, unit=unit, alt=alt, line=line, solid=solid);
ldraw_lib__s__98138s01(line=0.2);
// file: ../p/4-4disc.scad
use <../lib.scad>
function ldraw_lib__4_4disc() = [
// 0 Disc 1.0
// 0 Name: 4-4disc.dat
// 0 Author: James Jessiman
// 0 !LDRAW_ORG Primitive UPDATE 2002-02
// 0 !LICENSE Licensed under CC BY 4.0 : see CAreadme.txt
// 
// 0 BFC CERTIFY CCW
  [0,"BFC","CERTIFY"],
  [0,"BFC","CCW"],
// 
// 0 !HISTORY 1998-12-15 [PTadmin] Official Update 1998-10
// 0 !HISTORY 2002-03-23 [sbliss] Added BFC statement
// 0 !HISTORY 2002-04-25 [PTadmin] Official Update 2002-02
// 0 !HISTORY 2007-06-24 [PTadmin] Header formatted for Contributor Agreement
// 0 !HISTORY 2008-07-01 [PTadmin] Official Update 2008-01
// 
// 
// 3 16 0 0 0 1 0 0 0.9239 0 0.3827
  [3,16,0,0,0,1,0,0,0.9239,0,0.3827],
// 3 16 0 0 0 0.9239 0 0.3827 0.7071 0 0.7071
  [3,16,0,0,0,0.9239,0,0.3827,0.7071,0,0.7071],
// 3 16 0 0 0 0.7071 0 0.7071 0.3827 0 0.9239
  [3,16,0,0,0,0.7071,0,0.7071,0.3827,0,0.9239],
// 3 16 0 0 0 0.3827 0 0.9239 0 0 1
  [3,16,0,0,0,0.3827,0,0.9239,0,0,1],
// 3 16 0 0 0 0 0 1 -0.3827 0 0.9239
  [3,16,0,0,0,0,0,1,-0.3827,0,0.9239],
// 3 16 0 0 0 -0.3827 0 0.9239 -0.7071 0 0.7071
  [3,16,0,0,0,-0.3827,0,0.9239,-0.7071,0,0.7071],
// 3 16 0 0 0 -0.7071 0 0.7071 -0.9239 0 0.3827
  [3,16,0,0,0,-0.7071,0,0.7071,-0.9239,0,0.3827],
// 3 16 0 0 0 -0.9239 0 0.3827 -1 0 -0
  [3,16,0,0,0,-0.9239,0,0.3827,-1,0,-0],
// 3 16 0 0 0 -1 0 -0 -0.9239 0 -0.3827
  [3,16,0,0,0,-1,0,-0,-0.9239,0,-0.3827],
// 3 16 0 0 0 -0.9239 0 -0.3827 -0.7071 0 -0.7071
  [3,16,0,0,0,-0.9239,0,-0.3827,-0.7071,0,-0.7071],
// 3 16 0 0 0 -0.7071 0 -0.7071 -0.3827 0 -0.9239
  [3,16,0,0,0,-0.7071,0,-0.7071,-0.3827,0,-0.9239],
// 3 16 0 0 0 -0.3827 0 -0.9239 0 0 -1
  [3,16,0,0,0,-0.3827,0,-0.9239,0,0,-1],
// 3 16 0 0 0 0 0 -1 0.3827 0 -0.9239
  [3,16,0,0,0,0,0,-1,0.3827,0,-0.9239],
// 3 16 0 0 0 0.3827 0 -0.9239 0.7071 0 -0.7071
  [3,16,0,0,0,0.3827,0,-0.9239,0.7071,0,-0.7071],
// 3 16 0 0 0 0.7071 0 -0.7071 0.9239 0 -0.3827
  [3,16,0,0,0,0.7071,0,-0.7071,0.9239,0,-0.3827],
// 3 16 0 0 0 0.9239 0 -0.3827 1 0 0
  [3,16,0,0,0,0.9239,0,-0.3827,1,0,0],
// 0
];
module ldraw_lib__4_4disc(step=0, col=false, unit=2/5, alt=false, line=0.2, solid=!$preview)
    makepoly(ldraw_lib__4_4disc(), step=step, col=col, unit=unit, alt=alt, line=line, solid=solid);
ldraw_lib__4_4disc(line=0.2);
// file: 98138.scad
use <../lib.scad>
use <../p/4-4disc.scad>
use <s/98138s01.scad>
function ldraw_lib__98138() = [
// 0 Tile  1 x  1 Round with Groove
// 0 Name: 98138.dat
// 0 Author: Magnus Forsberg [MagFors]
// 0 !LDRAW_ORG Part UPDATE 2011-02
// 0 !LICENSE Licensed under CC BY 4.0 : see CAreadme.txt
// 
// 0 BFC CERTIFY CCW
  [0,"BFC","CERTIFY"],
  [0,"BFC","CCW"],
// 
// 0 !HISTORY 2011-12-29 [PTadmin] Official Update 2011-02
// 
// 
// 1 16 0 0 0 1 0 0 0 1 0 0 0 1 s\98138s01.dat
  [1,16,0,0,0,1,0,0,0,1,0,0,0,1, ldraw_lib__s__98138s01()],
// 1 16 0 0 0 9 0 0 0 1 0 0 0 9 4-4disc.dat
  [1,16,0,0,0,9,0,0,0,1,0,0,0,9, ldraw_lib__4_4disc()],
// 
];
module ldraw_lib__98138(step=0, col=false, unit=2/5, alt=false, line=0.2, solid=!$preview)
    makepoly(ldraw_lib__98138(), step=step, col=col, unit=unit, alt=alt, line=line, solid=solid);
ldraw_lib__98138(line=0.2);
// main file
use <../lib.scad>
use <98138.scad>
function ldraw_lib__35380() = [
// 0 =Tile  1 x  1 Round with Groove
// 0 Name: 35380.dat
// 0 Author: Massimo Maso [Sirio]
// 0 !LDRAW_ORG Part Alias UPDATE 2025-05
// 0 !LICENSE Licensed under CC BY 4.0 : see CAreadme.txt
// 
// 0 BFC CERTIFY CCW
  [0,"BFC","CERTIFY"],
  [0,"BFC","CCW"],
// 
// 0 !KEYWORDS BrickLink 98138, Rebrickable 98138
// 
// 0 !HISTORY 2025-05-28 [OrionP] Official Update 2025-05
// 
// 1 16 0 0 0 1 0 0 0 1 0 0 0 1 98138.dat
  [1,16,0,0,0,1,0,0,0,1,0,0,0,1, ldraw_lib__98138()],
];
module ldraw_lib__35380(step=0, col=false, unit=2/5, alt=false, line=0.2, solid=!$preview)
    makepoly(ldraw_lib__35380(), step=step, col=col, unit=unit, alt=alt, line=line, solid=solid);
ldraw_lib__35380(line=0.2);
